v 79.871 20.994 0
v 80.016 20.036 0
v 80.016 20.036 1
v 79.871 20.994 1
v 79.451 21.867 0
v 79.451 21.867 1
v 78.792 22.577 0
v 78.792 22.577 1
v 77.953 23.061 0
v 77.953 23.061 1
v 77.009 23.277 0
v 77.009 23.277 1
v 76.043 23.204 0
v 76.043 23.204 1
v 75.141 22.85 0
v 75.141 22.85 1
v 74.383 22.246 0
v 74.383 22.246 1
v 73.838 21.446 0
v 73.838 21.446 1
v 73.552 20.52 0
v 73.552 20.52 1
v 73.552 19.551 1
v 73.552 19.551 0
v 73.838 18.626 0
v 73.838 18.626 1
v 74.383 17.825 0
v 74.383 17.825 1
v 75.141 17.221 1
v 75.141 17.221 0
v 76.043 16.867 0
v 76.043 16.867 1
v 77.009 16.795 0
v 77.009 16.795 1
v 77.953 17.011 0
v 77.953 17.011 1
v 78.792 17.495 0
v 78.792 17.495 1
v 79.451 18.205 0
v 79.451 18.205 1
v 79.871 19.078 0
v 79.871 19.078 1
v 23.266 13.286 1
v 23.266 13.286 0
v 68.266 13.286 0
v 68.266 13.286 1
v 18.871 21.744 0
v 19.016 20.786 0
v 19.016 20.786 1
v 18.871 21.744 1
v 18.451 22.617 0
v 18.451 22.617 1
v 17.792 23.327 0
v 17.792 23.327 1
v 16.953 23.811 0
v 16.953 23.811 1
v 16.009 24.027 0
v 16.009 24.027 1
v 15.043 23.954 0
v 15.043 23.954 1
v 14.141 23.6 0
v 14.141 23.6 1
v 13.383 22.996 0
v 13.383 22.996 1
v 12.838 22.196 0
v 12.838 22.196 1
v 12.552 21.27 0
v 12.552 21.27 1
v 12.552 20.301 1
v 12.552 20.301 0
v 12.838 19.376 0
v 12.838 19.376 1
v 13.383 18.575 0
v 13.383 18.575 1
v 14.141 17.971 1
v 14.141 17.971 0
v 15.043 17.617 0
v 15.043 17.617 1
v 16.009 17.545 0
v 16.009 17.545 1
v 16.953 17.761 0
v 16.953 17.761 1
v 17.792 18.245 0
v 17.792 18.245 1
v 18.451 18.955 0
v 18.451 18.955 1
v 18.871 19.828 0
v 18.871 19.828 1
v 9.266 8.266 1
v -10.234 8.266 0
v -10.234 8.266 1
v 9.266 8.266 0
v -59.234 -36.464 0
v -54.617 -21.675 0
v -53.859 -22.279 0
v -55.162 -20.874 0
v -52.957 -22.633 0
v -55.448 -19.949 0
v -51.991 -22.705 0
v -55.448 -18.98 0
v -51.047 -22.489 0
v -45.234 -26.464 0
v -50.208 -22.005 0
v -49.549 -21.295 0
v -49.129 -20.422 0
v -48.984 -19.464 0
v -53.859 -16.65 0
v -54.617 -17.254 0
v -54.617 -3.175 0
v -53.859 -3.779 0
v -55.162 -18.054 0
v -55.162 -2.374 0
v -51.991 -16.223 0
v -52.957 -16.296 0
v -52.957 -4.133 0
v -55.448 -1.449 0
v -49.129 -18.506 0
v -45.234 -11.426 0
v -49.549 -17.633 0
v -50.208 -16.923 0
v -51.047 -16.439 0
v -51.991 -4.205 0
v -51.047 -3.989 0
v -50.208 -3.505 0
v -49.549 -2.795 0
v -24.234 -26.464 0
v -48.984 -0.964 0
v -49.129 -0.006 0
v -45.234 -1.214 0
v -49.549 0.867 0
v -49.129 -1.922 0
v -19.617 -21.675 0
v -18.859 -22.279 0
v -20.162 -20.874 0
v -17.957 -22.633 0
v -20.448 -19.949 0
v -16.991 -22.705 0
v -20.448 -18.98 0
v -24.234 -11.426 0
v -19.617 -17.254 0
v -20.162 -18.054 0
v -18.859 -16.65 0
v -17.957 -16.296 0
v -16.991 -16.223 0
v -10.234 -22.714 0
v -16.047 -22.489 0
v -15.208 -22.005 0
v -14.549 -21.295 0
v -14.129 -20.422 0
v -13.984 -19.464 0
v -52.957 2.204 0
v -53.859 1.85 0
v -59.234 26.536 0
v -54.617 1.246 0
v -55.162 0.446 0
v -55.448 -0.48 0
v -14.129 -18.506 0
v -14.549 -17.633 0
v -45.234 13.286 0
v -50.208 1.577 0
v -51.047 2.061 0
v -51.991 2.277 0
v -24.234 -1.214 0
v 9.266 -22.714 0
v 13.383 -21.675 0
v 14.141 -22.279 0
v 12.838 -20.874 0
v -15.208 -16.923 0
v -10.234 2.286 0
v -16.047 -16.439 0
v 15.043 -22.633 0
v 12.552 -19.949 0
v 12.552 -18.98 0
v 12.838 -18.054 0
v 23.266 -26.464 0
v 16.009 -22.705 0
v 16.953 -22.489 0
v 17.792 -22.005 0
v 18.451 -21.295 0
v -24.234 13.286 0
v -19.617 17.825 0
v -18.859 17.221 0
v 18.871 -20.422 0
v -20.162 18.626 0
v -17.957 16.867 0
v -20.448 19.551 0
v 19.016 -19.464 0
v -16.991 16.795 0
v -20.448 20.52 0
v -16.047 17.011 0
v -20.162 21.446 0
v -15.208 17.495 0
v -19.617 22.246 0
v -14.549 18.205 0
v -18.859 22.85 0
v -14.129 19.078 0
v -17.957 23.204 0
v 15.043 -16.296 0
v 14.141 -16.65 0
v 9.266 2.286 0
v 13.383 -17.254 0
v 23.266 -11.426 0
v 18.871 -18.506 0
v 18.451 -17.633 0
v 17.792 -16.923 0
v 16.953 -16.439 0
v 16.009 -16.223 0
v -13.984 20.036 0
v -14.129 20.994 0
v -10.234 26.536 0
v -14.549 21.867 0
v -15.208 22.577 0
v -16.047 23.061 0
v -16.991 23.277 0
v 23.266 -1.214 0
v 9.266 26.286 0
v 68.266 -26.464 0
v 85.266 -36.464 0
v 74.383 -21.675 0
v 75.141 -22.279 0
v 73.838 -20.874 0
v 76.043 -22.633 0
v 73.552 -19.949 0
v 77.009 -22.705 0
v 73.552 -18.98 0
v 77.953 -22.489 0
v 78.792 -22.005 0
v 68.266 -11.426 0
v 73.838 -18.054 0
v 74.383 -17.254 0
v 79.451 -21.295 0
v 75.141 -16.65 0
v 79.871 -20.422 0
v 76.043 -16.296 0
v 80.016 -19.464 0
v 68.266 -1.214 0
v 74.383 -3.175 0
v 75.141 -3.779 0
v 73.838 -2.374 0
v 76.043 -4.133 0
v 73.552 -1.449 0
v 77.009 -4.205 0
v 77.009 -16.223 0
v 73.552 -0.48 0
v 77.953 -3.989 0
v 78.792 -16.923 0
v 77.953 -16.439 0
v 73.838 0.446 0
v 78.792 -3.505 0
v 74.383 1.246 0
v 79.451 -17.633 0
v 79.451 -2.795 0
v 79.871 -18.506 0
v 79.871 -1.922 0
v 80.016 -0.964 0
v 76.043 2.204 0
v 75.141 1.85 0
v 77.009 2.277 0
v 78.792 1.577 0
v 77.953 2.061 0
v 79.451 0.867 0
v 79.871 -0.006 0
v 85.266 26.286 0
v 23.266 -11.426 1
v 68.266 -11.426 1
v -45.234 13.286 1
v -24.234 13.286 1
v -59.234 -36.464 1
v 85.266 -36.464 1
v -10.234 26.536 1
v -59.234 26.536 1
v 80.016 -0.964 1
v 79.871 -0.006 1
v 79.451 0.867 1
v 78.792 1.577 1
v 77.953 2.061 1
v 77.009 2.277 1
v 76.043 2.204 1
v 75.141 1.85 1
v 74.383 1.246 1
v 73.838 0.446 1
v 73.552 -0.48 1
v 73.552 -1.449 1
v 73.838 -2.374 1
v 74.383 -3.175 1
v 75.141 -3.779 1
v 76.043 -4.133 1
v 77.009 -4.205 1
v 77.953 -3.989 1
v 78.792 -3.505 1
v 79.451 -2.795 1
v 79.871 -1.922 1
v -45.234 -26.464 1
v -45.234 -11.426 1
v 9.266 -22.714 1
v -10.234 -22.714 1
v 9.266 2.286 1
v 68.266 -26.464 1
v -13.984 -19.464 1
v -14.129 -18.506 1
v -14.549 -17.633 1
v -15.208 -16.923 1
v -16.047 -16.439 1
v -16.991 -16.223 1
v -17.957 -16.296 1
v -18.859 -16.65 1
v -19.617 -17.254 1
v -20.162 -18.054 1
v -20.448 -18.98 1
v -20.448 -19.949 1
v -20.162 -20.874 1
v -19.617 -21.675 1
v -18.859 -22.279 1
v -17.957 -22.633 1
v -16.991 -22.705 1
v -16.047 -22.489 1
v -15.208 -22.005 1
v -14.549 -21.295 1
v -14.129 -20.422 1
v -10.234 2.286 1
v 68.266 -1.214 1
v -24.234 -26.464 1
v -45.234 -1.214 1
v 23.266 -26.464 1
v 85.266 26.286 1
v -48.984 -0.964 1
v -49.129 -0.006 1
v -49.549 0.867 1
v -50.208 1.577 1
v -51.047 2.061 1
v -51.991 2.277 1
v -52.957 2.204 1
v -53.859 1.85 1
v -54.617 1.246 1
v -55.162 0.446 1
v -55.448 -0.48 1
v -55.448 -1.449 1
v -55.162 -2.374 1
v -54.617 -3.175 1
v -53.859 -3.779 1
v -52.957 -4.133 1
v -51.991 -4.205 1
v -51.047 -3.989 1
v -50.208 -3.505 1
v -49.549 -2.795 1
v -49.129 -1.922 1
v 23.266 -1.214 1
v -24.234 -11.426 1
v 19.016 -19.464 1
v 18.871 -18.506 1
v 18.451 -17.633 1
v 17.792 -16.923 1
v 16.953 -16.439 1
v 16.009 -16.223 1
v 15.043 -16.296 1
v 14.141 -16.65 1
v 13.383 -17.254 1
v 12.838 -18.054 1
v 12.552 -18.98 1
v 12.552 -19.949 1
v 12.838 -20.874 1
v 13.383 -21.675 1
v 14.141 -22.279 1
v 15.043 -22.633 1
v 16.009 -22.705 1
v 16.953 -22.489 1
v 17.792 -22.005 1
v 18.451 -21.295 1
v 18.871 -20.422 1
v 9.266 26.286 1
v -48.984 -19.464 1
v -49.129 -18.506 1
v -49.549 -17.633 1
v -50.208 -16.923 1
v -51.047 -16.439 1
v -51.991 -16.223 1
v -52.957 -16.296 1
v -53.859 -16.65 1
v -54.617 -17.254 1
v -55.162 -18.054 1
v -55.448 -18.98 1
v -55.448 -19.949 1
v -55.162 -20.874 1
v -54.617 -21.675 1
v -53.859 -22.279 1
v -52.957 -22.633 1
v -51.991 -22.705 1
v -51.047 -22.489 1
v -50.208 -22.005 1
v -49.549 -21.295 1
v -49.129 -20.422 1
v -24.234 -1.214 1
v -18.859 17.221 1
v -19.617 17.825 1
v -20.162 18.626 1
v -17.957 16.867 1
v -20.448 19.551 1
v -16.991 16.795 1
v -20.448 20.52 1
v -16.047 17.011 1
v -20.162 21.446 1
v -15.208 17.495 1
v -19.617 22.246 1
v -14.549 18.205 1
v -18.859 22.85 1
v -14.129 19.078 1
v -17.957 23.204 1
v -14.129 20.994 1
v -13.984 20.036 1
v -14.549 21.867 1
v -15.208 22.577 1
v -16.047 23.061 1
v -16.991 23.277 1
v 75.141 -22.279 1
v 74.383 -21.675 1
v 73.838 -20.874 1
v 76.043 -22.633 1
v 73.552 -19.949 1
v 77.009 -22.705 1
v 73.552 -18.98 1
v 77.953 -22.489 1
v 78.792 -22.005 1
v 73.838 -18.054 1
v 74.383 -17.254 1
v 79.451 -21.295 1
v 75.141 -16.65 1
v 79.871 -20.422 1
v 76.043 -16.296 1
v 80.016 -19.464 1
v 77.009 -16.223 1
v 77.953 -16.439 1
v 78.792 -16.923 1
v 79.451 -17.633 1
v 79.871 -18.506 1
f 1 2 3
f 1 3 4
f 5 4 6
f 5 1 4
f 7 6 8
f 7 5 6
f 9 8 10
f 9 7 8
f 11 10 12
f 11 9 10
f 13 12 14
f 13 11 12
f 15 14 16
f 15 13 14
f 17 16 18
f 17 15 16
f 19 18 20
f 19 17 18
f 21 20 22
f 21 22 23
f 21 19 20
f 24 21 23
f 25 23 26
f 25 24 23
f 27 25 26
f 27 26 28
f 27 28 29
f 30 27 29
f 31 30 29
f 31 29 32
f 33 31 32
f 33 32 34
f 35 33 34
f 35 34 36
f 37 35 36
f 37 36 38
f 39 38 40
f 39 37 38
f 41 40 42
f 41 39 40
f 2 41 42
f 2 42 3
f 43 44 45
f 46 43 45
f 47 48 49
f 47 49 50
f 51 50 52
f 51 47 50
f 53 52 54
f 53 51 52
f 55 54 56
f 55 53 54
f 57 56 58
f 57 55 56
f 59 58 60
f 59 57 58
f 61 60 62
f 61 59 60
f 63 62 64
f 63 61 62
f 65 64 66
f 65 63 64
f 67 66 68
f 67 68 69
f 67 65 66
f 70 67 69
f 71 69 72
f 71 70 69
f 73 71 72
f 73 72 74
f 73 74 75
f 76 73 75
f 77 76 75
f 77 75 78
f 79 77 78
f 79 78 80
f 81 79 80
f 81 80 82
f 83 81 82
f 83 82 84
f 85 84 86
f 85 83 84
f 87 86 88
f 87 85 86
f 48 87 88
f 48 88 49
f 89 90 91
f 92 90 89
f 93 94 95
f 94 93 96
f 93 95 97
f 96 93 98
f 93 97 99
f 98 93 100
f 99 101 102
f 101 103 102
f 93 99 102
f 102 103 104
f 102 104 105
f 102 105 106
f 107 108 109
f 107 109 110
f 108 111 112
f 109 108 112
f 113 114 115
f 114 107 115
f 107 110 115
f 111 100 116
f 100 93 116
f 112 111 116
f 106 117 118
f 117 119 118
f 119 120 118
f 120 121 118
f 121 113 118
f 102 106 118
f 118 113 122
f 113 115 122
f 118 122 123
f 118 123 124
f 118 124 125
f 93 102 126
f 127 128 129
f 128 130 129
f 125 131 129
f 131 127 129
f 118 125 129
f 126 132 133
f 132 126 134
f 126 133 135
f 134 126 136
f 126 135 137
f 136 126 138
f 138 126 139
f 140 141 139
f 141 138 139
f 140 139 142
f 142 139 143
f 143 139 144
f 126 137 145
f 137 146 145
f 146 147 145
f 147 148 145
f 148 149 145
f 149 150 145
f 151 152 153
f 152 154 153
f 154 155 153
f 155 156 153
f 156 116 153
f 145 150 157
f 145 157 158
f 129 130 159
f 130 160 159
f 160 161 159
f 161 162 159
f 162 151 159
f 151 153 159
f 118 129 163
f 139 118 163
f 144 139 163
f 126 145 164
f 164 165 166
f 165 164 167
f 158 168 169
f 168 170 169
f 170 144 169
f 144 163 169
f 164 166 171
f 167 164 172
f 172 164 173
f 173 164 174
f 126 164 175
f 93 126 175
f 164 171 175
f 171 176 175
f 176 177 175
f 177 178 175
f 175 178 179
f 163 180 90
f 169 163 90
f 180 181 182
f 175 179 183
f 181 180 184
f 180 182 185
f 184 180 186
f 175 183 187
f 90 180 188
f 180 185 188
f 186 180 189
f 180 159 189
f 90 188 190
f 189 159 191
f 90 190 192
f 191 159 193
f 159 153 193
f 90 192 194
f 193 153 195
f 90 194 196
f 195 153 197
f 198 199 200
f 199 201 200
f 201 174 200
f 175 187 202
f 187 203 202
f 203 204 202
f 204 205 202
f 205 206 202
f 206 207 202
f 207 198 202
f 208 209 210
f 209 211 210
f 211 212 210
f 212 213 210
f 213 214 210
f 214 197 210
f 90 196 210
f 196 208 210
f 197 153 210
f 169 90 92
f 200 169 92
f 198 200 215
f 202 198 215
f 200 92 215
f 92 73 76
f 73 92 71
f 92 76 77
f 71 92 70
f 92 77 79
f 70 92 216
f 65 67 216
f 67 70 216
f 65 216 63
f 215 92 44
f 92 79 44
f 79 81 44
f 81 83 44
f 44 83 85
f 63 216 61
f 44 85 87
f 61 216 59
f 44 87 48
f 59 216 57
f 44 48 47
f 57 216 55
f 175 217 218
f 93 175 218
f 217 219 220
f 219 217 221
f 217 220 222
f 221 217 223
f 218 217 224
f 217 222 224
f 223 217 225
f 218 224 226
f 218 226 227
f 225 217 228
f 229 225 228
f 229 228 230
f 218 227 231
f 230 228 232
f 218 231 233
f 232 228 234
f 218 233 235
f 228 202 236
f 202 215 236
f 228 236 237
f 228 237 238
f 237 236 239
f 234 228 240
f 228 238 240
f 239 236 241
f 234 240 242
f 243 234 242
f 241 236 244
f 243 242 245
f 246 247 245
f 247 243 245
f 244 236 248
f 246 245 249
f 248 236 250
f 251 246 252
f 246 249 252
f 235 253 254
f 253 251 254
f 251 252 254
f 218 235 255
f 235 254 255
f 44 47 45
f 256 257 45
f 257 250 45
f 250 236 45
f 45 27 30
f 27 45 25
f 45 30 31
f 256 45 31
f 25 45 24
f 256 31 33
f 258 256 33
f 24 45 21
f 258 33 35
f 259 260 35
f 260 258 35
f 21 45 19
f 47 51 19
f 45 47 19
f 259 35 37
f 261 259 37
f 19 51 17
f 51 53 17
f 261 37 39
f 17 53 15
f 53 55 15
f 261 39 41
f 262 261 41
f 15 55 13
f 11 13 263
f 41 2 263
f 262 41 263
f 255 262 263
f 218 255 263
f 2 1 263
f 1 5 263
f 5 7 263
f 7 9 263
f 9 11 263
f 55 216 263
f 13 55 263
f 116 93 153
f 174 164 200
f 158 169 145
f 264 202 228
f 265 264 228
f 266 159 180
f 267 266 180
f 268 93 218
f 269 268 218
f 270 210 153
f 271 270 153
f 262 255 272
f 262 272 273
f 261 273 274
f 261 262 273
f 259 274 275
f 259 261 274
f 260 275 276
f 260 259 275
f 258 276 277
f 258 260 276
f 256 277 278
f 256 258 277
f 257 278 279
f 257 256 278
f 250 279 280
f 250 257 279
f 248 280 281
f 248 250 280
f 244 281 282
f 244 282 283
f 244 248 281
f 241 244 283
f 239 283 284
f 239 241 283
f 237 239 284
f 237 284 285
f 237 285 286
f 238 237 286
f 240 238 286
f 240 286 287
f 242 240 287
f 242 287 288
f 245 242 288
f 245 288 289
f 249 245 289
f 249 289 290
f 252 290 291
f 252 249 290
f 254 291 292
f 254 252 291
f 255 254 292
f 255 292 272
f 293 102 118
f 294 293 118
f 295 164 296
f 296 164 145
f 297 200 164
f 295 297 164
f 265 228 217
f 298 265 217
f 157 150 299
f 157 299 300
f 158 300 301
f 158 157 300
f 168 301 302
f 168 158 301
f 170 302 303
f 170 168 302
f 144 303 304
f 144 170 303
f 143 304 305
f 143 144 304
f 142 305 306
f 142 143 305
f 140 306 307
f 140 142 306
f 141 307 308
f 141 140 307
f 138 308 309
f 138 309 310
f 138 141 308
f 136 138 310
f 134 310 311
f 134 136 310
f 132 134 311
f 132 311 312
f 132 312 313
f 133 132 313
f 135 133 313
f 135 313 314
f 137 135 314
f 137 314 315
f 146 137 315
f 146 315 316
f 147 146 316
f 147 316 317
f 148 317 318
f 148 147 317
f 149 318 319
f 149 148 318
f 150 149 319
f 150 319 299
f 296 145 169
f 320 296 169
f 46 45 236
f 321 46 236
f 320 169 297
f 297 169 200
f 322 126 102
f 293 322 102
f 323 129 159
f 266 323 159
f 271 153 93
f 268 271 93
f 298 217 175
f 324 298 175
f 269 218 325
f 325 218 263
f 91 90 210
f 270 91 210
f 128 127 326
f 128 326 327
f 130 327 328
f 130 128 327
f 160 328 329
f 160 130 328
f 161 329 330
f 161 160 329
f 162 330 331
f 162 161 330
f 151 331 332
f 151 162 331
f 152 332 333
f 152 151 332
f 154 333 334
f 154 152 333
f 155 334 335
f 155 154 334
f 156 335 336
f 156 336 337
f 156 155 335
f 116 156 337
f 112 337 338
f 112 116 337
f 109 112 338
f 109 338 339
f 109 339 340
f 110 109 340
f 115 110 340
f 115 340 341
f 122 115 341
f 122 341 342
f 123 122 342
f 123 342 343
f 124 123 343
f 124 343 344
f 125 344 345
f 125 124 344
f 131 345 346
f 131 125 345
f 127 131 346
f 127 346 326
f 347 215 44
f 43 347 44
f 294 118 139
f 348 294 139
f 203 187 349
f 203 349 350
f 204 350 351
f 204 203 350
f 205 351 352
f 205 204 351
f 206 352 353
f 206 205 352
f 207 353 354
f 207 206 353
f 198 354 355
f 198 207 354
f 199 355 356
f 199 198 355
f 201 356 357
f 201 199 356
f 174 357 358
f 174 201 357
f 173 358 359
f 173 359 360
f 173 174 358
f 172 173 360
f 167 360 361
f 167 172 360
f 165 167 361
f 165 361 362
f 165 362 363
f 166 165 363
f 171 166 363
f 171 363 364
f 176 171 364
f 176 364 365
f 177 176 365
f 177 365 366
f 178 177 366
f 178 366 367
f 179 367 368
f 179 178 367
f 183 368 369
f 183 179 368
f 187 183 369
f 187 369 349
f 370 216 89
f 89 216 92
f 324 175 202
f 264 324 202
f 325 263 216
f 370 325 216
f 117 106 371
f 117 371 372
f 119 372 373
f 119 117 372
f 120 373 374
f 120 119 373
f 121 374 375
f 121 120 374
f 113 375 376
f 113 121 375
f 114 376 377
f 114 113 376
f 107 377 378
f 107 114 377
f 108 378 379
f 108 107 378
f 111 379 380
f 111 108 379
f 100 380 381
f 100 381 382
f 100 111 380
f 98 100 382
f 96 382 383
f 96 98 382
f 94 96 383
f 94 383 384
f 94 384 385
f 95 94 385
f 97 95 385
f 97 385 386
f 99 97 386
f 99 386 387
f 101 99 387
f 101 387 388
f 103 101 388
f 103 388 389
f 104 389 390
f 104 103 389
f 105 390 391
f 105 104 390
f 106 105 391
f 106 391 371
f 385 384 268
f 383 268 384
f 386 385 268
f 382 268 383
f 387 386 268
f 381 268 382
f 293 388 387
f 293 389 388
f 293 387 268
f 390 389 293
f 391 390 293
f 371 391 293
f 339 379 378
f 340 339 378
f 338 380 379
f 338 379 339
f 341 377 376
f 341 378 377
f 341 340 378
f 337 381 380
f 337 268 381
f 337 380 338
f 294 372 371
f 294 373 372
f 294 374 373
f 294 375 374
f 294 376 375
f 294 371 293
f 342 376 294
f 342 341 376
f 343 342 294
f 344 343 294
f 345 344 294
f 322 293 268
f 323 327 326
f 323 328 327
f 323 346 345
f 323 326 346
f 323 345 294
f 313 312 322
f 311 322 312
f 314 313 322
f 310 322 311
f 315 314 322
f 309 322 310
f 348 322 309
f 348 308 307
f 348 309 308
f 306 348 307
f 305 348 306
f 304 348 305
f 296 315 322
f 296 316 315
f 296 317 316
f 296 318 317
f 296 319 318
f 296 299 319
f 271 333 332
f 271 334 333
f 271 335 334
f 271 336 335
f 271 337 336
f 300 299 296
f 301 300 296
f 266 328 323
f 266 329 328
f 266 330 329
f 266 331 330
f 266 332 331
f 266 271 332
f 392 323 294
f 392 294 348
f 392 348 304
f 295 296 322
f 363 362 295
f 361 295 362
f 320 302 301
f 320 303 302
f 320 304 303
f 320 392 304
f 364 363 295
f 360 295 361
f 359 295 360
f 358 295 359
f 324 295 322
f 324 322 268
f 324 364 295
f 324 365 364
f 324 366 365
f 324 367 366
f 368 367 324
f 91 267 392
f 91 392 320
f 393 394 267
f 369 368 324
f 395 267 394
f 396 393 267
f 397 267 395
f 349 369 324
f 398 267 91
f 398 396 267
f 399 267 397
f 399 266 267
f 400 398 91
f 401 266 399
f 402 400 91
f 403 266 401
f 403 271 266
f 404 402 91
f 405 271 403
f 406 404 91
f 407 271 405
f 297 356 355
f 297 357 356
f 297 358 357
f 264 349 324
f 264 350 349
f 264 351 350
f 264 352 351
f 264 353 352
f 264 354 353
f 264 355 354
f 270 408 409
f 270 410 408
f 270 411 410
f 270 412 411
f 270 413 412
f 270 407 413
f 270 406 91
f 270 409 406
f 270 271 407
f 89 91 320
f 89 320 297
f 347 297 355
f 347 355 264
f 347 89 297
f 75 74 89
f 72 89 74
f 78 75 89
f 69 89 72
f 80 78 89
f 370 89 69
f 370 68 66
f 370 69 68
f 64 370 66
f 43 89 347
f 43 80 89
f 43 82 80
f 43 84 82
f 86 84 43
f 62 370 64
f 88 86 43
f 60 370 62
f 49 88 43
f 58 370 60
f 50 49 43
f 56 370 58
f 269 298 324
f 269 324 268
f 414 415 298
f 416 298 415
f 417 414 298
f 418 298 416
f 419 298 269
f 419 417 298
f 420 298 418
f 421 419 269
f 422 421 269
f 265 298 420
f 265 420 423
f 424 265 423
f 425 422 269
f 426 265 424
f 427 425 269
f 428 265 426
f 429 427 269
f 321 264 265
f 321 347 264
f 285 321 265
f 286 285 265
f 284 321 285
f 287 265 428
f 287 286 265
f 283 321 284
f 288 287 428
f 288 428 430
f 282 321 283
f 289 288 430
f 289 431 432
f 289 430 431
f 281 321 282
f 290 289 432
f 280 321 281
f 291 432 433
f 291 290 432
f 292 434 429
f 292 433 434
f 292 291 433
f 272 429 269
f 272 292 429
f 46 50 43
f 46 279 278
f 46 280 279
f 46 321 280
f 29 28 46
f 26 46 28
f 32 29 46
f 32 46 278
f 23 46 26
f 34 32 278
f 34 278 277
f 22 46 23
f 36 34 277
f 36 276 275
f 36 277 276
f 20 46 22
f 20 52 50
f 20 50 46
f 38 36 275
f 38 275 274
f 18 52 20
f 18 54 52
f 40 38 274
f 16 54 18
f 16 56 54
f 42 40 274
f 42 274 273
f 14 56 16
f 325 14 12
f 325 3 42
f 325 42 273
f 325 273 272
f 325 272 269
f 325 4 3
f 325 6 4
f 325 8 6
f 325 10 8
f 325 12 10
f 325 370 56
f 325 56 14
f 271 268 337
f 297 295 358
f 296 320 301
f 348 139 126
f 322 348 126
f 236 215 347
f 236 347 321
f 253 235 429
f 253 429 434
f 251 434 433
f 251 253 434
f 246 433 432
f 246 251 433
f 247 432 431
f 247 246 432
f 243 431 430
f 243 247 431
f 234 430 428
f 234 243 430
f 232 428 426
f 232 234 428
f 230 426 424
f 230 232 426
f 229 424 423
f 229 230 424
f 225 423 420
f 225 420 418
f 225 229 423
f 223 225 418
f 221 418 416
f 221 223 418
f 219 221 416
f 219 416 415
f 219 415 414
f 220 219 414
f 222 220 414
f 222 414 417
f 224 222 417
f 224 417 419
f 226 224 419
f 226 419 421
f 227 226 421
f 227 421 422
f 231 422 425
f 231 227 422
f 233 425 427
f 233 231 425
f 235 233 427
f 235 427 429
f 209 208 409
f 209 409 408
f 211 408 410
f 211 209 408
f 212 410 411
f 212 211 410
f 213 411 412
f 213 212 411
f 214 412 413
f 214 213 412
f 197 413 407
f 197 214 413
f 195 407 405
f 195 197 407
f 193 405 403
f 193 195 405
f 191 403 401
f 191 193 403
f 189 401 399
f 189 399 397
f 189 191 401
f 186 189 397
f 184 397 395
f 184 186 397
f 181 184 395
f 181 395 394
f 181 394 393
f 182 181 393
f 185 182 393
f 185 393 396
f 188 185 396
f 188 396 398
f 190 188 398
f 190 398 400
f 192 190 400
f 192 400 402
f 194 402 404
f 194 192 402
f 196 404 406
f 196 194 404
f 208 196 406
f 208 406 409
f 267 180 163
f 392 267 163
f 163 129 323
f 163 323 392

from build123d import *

# Parameters (mm, degrees)
F0_R     = 3.25
F0_W     = 21
F0_H     = 10.2114447155
F0_W_2   = 19.5
F0_H_2   = 5.9798656802
F0_W_3   = 45
F1_DEPTH = 1


# Not quite as in the source:
# - a feature names something its author has since deleted; it is built from what else it names


with BuildPart() as f1:
    # F0 (on Top) → F1 (new body)
    with BuildSketch(Plane.XY):
        Polygon((85.2658590674, -26.4641552444), (85.2658590674, 13.2858447556), (68.2658590674, 13.2858447556), (68.2658590674, -1.2141552444), (68.2658590674, -11.42559996), (68.2658590674, -26.4641552444), (23.2658590674, -26.4641552444), (9.2658590674, -26.4641552444), (9.2658590674, -22.7141552444), (-10.2341409326, -22.7141552444), (-10.2341409326, -26.4641552444), (-24.2341409326, -26.4641552444), (-45.2341409326, -26.4641552444), (-45.2341409326, -11.42559996), (-45.2341409326, -1.2141552444), (-45.2341409326, 13.2858447556), (-59.2341409326, 13.2858447556), (-59.2341409326, -26.4641552444), (-59.2341409326, -36.4641552444), (-24.2341409326, -36.4641552444), (85.2658590674, -36.4641552444), align=None)
        with Locations((-52.2341409326, -19.4641552444)):
            Circle(F0_R, mode=Mode.SUBTRACT)
        with Locations((76.7658590674, -19.4641552444)):
            Circle(F0_R, mode=Mode.SUBTRACT)
        with Locations((-52.2341409326, -0.9641552444)):
            Circle(F0_R, mode=Mode.SUBTRACT)
        with Locations((76.7658590674, -0.9641552444)):
            Circle(F0_R, mode=Mode.SUBTRACT)
        with Locations((-34.7341409326, -6.3198776022)):
            Rectangle(F0_W, F0_H)
        with Locations((-0.4841409326, 5.2757775957)):
            Rectangle(F0_W_2, F0_H_2)
        with Locations((45.7658590674, -6.3198776022)):
            Rectangle(F0_W_3, F0_H)
        Polygon((-24.2341409326, 13.2858447556), (-10.2341409326, 13.2858447556), (-10.2341409326, 26.5358447556), (-59.2341409326, 26.5358447556), (-59.2341409326, 13.2858447556), (-45.2341409326, 13.2858447556), align=None)
        with Locations((-17.2341409326, 20.0358447556)):
            Circle(F0_R, mode=Mode.SUBTRACT)
        Polygon((85.2658590674, 13.2858447556), (85.2658590674, 26.2858447556), (9.2658590674, 26.2858447556), (9.2658590674, 13.2858447556), (23.2658590674, 13.2858447556), (68.2658590674, 13.2858447556), align=None)
        with Locations((15.7658590674, 20.7858447556)):
            Circle(F0_R, mode=Mode.SUBTRACT)
        with Locations((76.7658590674, 20.0358447556)):
            Circle(F0_R, mode=Mode.SUBTRACT)
        Polygon((-10.2341409326, 2.2858447556), (-10.2341409326, 8.2657104358), (-10.2341409326, 13.2858447556), (-24.2341409326, 13.2858447556), (-24.2341409326, -1.2141552444), (-24.2341409326, -11.42559996), (-24.2341409326, -26.4641552444), (-10.2341409326, -26.4641552444), (-10.2341409326, -22.7141552444), align=None)
        with Locations((-17.2341409326, -19.4641552444)):
            Circle(F0_R, mode=Mode.SUBTRACT)
        Polygon((23.2658590674, 13.2858447556), (9.2658590674, 13.2858447556), (9.2658590674, 8.2657104358), (9.2658590674, 2.2858447556), (9.2658590674, -22.7141552444), (9.2658590674, -26.4641552444), (23.2658590674, -26.4641552444), (23.2658590674, -11.42559996), (23.2658590674, -1.2141552444), align=None)
        with Locations((15.7658590674, -19.4641552444)):
            Circle(F0_R, mode=Mode.SUBTRACT)
    extrude(amount=F1_DEPTH)


solid = f1.part
